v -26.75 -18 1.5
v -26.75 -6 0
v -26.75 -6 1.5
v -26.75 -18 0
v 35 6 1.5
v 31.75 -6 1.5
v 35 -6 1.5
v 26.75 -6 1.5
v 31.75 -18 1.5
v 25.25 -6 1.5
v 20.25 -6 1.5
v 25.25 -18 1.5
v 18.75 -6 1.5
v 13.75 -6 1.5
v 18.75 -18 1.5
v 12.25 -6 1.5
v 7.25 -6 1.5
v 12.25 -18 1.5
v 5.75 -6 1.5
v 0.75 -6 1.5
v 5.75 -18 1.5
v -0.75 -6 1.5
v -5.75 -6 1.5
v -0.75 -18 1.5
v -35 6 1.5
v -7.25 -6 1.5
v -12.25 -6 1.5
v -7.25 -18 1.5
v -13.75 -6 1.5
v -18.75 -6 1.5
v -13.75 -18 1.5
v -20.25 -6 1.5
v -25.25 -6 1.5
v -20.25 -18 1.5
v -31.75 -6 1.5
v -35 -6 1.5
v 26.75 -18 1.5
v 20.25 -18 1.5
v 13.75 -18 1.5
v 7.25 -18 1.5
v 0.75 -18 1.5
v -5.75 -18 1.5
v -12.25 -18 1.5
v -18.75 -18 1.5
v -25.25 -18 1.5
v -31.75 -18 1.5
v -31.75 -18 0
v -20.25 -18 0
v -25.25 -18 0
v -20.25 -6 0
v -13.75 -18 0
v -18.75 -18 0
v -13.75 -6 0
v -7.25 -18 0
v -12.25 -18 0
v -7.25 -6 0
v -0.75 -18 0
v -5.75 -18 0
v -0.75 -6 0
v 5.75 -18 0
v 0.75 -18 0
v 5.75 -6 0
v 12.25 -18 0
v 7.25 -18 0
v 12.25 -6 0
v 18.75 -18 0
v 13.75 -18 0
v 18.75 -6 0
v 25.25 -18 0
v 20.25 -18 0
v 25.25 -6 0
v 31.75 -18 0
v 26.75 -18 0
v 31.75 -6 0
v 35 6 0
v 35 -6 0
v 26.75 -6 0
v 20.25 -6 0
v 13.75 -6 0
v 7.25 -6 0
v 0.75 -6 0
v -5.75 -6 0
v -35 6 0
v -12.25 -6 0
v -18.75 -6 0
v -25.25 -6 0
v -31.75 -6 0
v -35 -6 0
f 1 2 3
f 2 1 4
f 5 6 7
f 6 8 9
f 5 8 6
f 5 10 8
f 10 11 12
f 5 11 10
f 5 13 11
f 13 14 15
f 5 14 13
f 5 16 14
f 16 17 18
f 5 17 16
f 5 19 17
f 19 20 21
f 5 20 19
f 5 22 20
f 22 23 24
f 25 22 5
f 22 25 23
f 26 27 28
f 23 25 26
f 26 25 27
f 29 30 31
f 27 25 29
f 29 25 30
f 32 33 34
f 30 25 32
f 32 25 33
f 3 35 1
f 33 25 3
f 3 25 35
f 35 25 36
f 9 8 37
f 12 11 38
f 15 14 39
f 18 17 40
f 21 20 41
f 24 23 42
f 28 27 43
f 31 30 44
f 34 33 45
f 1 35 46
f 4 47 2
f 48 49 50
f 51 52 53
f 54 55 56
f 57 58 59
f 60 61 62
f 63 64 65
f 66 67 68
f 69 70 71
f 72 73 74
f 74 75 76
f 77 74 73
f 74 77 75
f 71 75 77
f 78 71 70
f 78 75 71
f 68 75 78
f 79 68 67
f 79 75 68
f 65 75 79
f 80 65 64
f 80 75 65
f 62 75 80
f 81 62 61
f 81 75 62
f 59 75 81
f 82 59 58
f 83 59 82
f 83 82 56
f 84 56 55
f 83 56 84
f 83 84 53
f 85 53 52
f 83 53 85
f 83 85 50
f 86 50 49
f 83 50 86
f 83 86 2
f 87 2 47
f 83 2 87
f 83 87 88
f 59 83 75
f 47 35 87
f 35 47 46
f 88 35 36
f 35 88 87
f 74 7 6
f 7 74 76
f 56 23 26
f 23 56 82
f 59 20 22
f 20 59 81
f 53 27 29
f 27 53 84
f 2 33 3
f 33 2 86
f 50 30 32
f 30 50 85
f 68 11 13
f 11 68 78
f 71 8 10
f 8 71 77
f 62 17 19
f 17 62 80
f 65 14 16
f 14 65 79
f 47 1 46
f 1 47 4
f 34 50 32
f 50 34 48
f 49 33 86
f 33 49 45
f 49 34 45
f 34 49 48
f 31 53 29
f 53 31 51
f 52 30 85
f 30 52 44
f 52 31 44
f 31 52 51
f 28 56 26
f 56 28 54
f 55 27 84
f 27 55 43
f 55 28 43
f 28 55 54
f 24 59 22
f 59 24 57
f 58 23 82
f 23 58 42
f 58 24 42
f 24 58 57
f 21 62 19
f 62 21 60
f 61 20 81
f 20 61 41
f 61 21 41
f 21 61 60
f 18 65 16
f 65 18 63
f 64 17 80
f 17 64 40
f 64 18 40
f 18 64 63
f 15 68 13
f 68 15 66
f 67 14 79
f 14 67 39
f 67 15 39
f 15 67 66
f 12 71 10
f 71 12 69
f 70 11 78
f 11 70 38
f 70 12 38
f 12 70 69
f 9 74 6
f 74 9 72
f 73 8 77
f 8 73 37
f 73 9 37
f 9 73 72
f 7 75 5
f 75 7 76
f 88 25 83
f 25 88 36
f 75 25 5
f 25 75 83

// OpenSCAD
// 10-well agarose gel comb, printed flat (Z = thickness)
// All dimensions in mm, measured with calipers.

// Global
$fn = 64;

// Spine (back bar)
spine_len   = 70;   // X
spine_wid   = 12;   // Y
spine_thick = 1.5;  // Z

// Teeth
n_teeth     = 10;   // number of wells/teeth
tooth_wid   = 5.0;  // X
tooth_len   = 12;   // Y (hangs in -Y from spine)
tooth_gap   = 1.5;  // X gap between neighbouring teeth

// Derived layout
tooth_pitch = tooth_wid + tooth_gap;                 // 6.5 mm
row_width   = n_teeth * tooth_wid + (n_teeth - 1) * tooth_gap; // 56.5 mm

// Spine centred on origin in X and Y
spine_x0 = -spine_len / 2;
spine_y0 = -spine_wid / 2;

// Row of teeth centred on spine in X
row_x0 = -row_width / 2;

// Teeth hang in -Y from the spine's -Y edge (y = -spine_wid/2)
tooth_y0 = -spine_wid / 2 - tooth_len;

// Build the comb as a union of the spine and the tooth row
union() {
    // Spine
    translate([spine_x0, spine_y0, 0])
        cube([spine_len, spine_wid, spine_thick], center = false);

    // Teeth (10 of them, evenly spaced, centred on spine in X)
    for (i = [0 : n_teeth - 1]) {
        x_i = row_x0 + i * tooth_pitch;
        translate([x_i, tooth_y0, 0])
            cube([tooth_wid, tooth_len, spine_thick], center = false);
    }
}
